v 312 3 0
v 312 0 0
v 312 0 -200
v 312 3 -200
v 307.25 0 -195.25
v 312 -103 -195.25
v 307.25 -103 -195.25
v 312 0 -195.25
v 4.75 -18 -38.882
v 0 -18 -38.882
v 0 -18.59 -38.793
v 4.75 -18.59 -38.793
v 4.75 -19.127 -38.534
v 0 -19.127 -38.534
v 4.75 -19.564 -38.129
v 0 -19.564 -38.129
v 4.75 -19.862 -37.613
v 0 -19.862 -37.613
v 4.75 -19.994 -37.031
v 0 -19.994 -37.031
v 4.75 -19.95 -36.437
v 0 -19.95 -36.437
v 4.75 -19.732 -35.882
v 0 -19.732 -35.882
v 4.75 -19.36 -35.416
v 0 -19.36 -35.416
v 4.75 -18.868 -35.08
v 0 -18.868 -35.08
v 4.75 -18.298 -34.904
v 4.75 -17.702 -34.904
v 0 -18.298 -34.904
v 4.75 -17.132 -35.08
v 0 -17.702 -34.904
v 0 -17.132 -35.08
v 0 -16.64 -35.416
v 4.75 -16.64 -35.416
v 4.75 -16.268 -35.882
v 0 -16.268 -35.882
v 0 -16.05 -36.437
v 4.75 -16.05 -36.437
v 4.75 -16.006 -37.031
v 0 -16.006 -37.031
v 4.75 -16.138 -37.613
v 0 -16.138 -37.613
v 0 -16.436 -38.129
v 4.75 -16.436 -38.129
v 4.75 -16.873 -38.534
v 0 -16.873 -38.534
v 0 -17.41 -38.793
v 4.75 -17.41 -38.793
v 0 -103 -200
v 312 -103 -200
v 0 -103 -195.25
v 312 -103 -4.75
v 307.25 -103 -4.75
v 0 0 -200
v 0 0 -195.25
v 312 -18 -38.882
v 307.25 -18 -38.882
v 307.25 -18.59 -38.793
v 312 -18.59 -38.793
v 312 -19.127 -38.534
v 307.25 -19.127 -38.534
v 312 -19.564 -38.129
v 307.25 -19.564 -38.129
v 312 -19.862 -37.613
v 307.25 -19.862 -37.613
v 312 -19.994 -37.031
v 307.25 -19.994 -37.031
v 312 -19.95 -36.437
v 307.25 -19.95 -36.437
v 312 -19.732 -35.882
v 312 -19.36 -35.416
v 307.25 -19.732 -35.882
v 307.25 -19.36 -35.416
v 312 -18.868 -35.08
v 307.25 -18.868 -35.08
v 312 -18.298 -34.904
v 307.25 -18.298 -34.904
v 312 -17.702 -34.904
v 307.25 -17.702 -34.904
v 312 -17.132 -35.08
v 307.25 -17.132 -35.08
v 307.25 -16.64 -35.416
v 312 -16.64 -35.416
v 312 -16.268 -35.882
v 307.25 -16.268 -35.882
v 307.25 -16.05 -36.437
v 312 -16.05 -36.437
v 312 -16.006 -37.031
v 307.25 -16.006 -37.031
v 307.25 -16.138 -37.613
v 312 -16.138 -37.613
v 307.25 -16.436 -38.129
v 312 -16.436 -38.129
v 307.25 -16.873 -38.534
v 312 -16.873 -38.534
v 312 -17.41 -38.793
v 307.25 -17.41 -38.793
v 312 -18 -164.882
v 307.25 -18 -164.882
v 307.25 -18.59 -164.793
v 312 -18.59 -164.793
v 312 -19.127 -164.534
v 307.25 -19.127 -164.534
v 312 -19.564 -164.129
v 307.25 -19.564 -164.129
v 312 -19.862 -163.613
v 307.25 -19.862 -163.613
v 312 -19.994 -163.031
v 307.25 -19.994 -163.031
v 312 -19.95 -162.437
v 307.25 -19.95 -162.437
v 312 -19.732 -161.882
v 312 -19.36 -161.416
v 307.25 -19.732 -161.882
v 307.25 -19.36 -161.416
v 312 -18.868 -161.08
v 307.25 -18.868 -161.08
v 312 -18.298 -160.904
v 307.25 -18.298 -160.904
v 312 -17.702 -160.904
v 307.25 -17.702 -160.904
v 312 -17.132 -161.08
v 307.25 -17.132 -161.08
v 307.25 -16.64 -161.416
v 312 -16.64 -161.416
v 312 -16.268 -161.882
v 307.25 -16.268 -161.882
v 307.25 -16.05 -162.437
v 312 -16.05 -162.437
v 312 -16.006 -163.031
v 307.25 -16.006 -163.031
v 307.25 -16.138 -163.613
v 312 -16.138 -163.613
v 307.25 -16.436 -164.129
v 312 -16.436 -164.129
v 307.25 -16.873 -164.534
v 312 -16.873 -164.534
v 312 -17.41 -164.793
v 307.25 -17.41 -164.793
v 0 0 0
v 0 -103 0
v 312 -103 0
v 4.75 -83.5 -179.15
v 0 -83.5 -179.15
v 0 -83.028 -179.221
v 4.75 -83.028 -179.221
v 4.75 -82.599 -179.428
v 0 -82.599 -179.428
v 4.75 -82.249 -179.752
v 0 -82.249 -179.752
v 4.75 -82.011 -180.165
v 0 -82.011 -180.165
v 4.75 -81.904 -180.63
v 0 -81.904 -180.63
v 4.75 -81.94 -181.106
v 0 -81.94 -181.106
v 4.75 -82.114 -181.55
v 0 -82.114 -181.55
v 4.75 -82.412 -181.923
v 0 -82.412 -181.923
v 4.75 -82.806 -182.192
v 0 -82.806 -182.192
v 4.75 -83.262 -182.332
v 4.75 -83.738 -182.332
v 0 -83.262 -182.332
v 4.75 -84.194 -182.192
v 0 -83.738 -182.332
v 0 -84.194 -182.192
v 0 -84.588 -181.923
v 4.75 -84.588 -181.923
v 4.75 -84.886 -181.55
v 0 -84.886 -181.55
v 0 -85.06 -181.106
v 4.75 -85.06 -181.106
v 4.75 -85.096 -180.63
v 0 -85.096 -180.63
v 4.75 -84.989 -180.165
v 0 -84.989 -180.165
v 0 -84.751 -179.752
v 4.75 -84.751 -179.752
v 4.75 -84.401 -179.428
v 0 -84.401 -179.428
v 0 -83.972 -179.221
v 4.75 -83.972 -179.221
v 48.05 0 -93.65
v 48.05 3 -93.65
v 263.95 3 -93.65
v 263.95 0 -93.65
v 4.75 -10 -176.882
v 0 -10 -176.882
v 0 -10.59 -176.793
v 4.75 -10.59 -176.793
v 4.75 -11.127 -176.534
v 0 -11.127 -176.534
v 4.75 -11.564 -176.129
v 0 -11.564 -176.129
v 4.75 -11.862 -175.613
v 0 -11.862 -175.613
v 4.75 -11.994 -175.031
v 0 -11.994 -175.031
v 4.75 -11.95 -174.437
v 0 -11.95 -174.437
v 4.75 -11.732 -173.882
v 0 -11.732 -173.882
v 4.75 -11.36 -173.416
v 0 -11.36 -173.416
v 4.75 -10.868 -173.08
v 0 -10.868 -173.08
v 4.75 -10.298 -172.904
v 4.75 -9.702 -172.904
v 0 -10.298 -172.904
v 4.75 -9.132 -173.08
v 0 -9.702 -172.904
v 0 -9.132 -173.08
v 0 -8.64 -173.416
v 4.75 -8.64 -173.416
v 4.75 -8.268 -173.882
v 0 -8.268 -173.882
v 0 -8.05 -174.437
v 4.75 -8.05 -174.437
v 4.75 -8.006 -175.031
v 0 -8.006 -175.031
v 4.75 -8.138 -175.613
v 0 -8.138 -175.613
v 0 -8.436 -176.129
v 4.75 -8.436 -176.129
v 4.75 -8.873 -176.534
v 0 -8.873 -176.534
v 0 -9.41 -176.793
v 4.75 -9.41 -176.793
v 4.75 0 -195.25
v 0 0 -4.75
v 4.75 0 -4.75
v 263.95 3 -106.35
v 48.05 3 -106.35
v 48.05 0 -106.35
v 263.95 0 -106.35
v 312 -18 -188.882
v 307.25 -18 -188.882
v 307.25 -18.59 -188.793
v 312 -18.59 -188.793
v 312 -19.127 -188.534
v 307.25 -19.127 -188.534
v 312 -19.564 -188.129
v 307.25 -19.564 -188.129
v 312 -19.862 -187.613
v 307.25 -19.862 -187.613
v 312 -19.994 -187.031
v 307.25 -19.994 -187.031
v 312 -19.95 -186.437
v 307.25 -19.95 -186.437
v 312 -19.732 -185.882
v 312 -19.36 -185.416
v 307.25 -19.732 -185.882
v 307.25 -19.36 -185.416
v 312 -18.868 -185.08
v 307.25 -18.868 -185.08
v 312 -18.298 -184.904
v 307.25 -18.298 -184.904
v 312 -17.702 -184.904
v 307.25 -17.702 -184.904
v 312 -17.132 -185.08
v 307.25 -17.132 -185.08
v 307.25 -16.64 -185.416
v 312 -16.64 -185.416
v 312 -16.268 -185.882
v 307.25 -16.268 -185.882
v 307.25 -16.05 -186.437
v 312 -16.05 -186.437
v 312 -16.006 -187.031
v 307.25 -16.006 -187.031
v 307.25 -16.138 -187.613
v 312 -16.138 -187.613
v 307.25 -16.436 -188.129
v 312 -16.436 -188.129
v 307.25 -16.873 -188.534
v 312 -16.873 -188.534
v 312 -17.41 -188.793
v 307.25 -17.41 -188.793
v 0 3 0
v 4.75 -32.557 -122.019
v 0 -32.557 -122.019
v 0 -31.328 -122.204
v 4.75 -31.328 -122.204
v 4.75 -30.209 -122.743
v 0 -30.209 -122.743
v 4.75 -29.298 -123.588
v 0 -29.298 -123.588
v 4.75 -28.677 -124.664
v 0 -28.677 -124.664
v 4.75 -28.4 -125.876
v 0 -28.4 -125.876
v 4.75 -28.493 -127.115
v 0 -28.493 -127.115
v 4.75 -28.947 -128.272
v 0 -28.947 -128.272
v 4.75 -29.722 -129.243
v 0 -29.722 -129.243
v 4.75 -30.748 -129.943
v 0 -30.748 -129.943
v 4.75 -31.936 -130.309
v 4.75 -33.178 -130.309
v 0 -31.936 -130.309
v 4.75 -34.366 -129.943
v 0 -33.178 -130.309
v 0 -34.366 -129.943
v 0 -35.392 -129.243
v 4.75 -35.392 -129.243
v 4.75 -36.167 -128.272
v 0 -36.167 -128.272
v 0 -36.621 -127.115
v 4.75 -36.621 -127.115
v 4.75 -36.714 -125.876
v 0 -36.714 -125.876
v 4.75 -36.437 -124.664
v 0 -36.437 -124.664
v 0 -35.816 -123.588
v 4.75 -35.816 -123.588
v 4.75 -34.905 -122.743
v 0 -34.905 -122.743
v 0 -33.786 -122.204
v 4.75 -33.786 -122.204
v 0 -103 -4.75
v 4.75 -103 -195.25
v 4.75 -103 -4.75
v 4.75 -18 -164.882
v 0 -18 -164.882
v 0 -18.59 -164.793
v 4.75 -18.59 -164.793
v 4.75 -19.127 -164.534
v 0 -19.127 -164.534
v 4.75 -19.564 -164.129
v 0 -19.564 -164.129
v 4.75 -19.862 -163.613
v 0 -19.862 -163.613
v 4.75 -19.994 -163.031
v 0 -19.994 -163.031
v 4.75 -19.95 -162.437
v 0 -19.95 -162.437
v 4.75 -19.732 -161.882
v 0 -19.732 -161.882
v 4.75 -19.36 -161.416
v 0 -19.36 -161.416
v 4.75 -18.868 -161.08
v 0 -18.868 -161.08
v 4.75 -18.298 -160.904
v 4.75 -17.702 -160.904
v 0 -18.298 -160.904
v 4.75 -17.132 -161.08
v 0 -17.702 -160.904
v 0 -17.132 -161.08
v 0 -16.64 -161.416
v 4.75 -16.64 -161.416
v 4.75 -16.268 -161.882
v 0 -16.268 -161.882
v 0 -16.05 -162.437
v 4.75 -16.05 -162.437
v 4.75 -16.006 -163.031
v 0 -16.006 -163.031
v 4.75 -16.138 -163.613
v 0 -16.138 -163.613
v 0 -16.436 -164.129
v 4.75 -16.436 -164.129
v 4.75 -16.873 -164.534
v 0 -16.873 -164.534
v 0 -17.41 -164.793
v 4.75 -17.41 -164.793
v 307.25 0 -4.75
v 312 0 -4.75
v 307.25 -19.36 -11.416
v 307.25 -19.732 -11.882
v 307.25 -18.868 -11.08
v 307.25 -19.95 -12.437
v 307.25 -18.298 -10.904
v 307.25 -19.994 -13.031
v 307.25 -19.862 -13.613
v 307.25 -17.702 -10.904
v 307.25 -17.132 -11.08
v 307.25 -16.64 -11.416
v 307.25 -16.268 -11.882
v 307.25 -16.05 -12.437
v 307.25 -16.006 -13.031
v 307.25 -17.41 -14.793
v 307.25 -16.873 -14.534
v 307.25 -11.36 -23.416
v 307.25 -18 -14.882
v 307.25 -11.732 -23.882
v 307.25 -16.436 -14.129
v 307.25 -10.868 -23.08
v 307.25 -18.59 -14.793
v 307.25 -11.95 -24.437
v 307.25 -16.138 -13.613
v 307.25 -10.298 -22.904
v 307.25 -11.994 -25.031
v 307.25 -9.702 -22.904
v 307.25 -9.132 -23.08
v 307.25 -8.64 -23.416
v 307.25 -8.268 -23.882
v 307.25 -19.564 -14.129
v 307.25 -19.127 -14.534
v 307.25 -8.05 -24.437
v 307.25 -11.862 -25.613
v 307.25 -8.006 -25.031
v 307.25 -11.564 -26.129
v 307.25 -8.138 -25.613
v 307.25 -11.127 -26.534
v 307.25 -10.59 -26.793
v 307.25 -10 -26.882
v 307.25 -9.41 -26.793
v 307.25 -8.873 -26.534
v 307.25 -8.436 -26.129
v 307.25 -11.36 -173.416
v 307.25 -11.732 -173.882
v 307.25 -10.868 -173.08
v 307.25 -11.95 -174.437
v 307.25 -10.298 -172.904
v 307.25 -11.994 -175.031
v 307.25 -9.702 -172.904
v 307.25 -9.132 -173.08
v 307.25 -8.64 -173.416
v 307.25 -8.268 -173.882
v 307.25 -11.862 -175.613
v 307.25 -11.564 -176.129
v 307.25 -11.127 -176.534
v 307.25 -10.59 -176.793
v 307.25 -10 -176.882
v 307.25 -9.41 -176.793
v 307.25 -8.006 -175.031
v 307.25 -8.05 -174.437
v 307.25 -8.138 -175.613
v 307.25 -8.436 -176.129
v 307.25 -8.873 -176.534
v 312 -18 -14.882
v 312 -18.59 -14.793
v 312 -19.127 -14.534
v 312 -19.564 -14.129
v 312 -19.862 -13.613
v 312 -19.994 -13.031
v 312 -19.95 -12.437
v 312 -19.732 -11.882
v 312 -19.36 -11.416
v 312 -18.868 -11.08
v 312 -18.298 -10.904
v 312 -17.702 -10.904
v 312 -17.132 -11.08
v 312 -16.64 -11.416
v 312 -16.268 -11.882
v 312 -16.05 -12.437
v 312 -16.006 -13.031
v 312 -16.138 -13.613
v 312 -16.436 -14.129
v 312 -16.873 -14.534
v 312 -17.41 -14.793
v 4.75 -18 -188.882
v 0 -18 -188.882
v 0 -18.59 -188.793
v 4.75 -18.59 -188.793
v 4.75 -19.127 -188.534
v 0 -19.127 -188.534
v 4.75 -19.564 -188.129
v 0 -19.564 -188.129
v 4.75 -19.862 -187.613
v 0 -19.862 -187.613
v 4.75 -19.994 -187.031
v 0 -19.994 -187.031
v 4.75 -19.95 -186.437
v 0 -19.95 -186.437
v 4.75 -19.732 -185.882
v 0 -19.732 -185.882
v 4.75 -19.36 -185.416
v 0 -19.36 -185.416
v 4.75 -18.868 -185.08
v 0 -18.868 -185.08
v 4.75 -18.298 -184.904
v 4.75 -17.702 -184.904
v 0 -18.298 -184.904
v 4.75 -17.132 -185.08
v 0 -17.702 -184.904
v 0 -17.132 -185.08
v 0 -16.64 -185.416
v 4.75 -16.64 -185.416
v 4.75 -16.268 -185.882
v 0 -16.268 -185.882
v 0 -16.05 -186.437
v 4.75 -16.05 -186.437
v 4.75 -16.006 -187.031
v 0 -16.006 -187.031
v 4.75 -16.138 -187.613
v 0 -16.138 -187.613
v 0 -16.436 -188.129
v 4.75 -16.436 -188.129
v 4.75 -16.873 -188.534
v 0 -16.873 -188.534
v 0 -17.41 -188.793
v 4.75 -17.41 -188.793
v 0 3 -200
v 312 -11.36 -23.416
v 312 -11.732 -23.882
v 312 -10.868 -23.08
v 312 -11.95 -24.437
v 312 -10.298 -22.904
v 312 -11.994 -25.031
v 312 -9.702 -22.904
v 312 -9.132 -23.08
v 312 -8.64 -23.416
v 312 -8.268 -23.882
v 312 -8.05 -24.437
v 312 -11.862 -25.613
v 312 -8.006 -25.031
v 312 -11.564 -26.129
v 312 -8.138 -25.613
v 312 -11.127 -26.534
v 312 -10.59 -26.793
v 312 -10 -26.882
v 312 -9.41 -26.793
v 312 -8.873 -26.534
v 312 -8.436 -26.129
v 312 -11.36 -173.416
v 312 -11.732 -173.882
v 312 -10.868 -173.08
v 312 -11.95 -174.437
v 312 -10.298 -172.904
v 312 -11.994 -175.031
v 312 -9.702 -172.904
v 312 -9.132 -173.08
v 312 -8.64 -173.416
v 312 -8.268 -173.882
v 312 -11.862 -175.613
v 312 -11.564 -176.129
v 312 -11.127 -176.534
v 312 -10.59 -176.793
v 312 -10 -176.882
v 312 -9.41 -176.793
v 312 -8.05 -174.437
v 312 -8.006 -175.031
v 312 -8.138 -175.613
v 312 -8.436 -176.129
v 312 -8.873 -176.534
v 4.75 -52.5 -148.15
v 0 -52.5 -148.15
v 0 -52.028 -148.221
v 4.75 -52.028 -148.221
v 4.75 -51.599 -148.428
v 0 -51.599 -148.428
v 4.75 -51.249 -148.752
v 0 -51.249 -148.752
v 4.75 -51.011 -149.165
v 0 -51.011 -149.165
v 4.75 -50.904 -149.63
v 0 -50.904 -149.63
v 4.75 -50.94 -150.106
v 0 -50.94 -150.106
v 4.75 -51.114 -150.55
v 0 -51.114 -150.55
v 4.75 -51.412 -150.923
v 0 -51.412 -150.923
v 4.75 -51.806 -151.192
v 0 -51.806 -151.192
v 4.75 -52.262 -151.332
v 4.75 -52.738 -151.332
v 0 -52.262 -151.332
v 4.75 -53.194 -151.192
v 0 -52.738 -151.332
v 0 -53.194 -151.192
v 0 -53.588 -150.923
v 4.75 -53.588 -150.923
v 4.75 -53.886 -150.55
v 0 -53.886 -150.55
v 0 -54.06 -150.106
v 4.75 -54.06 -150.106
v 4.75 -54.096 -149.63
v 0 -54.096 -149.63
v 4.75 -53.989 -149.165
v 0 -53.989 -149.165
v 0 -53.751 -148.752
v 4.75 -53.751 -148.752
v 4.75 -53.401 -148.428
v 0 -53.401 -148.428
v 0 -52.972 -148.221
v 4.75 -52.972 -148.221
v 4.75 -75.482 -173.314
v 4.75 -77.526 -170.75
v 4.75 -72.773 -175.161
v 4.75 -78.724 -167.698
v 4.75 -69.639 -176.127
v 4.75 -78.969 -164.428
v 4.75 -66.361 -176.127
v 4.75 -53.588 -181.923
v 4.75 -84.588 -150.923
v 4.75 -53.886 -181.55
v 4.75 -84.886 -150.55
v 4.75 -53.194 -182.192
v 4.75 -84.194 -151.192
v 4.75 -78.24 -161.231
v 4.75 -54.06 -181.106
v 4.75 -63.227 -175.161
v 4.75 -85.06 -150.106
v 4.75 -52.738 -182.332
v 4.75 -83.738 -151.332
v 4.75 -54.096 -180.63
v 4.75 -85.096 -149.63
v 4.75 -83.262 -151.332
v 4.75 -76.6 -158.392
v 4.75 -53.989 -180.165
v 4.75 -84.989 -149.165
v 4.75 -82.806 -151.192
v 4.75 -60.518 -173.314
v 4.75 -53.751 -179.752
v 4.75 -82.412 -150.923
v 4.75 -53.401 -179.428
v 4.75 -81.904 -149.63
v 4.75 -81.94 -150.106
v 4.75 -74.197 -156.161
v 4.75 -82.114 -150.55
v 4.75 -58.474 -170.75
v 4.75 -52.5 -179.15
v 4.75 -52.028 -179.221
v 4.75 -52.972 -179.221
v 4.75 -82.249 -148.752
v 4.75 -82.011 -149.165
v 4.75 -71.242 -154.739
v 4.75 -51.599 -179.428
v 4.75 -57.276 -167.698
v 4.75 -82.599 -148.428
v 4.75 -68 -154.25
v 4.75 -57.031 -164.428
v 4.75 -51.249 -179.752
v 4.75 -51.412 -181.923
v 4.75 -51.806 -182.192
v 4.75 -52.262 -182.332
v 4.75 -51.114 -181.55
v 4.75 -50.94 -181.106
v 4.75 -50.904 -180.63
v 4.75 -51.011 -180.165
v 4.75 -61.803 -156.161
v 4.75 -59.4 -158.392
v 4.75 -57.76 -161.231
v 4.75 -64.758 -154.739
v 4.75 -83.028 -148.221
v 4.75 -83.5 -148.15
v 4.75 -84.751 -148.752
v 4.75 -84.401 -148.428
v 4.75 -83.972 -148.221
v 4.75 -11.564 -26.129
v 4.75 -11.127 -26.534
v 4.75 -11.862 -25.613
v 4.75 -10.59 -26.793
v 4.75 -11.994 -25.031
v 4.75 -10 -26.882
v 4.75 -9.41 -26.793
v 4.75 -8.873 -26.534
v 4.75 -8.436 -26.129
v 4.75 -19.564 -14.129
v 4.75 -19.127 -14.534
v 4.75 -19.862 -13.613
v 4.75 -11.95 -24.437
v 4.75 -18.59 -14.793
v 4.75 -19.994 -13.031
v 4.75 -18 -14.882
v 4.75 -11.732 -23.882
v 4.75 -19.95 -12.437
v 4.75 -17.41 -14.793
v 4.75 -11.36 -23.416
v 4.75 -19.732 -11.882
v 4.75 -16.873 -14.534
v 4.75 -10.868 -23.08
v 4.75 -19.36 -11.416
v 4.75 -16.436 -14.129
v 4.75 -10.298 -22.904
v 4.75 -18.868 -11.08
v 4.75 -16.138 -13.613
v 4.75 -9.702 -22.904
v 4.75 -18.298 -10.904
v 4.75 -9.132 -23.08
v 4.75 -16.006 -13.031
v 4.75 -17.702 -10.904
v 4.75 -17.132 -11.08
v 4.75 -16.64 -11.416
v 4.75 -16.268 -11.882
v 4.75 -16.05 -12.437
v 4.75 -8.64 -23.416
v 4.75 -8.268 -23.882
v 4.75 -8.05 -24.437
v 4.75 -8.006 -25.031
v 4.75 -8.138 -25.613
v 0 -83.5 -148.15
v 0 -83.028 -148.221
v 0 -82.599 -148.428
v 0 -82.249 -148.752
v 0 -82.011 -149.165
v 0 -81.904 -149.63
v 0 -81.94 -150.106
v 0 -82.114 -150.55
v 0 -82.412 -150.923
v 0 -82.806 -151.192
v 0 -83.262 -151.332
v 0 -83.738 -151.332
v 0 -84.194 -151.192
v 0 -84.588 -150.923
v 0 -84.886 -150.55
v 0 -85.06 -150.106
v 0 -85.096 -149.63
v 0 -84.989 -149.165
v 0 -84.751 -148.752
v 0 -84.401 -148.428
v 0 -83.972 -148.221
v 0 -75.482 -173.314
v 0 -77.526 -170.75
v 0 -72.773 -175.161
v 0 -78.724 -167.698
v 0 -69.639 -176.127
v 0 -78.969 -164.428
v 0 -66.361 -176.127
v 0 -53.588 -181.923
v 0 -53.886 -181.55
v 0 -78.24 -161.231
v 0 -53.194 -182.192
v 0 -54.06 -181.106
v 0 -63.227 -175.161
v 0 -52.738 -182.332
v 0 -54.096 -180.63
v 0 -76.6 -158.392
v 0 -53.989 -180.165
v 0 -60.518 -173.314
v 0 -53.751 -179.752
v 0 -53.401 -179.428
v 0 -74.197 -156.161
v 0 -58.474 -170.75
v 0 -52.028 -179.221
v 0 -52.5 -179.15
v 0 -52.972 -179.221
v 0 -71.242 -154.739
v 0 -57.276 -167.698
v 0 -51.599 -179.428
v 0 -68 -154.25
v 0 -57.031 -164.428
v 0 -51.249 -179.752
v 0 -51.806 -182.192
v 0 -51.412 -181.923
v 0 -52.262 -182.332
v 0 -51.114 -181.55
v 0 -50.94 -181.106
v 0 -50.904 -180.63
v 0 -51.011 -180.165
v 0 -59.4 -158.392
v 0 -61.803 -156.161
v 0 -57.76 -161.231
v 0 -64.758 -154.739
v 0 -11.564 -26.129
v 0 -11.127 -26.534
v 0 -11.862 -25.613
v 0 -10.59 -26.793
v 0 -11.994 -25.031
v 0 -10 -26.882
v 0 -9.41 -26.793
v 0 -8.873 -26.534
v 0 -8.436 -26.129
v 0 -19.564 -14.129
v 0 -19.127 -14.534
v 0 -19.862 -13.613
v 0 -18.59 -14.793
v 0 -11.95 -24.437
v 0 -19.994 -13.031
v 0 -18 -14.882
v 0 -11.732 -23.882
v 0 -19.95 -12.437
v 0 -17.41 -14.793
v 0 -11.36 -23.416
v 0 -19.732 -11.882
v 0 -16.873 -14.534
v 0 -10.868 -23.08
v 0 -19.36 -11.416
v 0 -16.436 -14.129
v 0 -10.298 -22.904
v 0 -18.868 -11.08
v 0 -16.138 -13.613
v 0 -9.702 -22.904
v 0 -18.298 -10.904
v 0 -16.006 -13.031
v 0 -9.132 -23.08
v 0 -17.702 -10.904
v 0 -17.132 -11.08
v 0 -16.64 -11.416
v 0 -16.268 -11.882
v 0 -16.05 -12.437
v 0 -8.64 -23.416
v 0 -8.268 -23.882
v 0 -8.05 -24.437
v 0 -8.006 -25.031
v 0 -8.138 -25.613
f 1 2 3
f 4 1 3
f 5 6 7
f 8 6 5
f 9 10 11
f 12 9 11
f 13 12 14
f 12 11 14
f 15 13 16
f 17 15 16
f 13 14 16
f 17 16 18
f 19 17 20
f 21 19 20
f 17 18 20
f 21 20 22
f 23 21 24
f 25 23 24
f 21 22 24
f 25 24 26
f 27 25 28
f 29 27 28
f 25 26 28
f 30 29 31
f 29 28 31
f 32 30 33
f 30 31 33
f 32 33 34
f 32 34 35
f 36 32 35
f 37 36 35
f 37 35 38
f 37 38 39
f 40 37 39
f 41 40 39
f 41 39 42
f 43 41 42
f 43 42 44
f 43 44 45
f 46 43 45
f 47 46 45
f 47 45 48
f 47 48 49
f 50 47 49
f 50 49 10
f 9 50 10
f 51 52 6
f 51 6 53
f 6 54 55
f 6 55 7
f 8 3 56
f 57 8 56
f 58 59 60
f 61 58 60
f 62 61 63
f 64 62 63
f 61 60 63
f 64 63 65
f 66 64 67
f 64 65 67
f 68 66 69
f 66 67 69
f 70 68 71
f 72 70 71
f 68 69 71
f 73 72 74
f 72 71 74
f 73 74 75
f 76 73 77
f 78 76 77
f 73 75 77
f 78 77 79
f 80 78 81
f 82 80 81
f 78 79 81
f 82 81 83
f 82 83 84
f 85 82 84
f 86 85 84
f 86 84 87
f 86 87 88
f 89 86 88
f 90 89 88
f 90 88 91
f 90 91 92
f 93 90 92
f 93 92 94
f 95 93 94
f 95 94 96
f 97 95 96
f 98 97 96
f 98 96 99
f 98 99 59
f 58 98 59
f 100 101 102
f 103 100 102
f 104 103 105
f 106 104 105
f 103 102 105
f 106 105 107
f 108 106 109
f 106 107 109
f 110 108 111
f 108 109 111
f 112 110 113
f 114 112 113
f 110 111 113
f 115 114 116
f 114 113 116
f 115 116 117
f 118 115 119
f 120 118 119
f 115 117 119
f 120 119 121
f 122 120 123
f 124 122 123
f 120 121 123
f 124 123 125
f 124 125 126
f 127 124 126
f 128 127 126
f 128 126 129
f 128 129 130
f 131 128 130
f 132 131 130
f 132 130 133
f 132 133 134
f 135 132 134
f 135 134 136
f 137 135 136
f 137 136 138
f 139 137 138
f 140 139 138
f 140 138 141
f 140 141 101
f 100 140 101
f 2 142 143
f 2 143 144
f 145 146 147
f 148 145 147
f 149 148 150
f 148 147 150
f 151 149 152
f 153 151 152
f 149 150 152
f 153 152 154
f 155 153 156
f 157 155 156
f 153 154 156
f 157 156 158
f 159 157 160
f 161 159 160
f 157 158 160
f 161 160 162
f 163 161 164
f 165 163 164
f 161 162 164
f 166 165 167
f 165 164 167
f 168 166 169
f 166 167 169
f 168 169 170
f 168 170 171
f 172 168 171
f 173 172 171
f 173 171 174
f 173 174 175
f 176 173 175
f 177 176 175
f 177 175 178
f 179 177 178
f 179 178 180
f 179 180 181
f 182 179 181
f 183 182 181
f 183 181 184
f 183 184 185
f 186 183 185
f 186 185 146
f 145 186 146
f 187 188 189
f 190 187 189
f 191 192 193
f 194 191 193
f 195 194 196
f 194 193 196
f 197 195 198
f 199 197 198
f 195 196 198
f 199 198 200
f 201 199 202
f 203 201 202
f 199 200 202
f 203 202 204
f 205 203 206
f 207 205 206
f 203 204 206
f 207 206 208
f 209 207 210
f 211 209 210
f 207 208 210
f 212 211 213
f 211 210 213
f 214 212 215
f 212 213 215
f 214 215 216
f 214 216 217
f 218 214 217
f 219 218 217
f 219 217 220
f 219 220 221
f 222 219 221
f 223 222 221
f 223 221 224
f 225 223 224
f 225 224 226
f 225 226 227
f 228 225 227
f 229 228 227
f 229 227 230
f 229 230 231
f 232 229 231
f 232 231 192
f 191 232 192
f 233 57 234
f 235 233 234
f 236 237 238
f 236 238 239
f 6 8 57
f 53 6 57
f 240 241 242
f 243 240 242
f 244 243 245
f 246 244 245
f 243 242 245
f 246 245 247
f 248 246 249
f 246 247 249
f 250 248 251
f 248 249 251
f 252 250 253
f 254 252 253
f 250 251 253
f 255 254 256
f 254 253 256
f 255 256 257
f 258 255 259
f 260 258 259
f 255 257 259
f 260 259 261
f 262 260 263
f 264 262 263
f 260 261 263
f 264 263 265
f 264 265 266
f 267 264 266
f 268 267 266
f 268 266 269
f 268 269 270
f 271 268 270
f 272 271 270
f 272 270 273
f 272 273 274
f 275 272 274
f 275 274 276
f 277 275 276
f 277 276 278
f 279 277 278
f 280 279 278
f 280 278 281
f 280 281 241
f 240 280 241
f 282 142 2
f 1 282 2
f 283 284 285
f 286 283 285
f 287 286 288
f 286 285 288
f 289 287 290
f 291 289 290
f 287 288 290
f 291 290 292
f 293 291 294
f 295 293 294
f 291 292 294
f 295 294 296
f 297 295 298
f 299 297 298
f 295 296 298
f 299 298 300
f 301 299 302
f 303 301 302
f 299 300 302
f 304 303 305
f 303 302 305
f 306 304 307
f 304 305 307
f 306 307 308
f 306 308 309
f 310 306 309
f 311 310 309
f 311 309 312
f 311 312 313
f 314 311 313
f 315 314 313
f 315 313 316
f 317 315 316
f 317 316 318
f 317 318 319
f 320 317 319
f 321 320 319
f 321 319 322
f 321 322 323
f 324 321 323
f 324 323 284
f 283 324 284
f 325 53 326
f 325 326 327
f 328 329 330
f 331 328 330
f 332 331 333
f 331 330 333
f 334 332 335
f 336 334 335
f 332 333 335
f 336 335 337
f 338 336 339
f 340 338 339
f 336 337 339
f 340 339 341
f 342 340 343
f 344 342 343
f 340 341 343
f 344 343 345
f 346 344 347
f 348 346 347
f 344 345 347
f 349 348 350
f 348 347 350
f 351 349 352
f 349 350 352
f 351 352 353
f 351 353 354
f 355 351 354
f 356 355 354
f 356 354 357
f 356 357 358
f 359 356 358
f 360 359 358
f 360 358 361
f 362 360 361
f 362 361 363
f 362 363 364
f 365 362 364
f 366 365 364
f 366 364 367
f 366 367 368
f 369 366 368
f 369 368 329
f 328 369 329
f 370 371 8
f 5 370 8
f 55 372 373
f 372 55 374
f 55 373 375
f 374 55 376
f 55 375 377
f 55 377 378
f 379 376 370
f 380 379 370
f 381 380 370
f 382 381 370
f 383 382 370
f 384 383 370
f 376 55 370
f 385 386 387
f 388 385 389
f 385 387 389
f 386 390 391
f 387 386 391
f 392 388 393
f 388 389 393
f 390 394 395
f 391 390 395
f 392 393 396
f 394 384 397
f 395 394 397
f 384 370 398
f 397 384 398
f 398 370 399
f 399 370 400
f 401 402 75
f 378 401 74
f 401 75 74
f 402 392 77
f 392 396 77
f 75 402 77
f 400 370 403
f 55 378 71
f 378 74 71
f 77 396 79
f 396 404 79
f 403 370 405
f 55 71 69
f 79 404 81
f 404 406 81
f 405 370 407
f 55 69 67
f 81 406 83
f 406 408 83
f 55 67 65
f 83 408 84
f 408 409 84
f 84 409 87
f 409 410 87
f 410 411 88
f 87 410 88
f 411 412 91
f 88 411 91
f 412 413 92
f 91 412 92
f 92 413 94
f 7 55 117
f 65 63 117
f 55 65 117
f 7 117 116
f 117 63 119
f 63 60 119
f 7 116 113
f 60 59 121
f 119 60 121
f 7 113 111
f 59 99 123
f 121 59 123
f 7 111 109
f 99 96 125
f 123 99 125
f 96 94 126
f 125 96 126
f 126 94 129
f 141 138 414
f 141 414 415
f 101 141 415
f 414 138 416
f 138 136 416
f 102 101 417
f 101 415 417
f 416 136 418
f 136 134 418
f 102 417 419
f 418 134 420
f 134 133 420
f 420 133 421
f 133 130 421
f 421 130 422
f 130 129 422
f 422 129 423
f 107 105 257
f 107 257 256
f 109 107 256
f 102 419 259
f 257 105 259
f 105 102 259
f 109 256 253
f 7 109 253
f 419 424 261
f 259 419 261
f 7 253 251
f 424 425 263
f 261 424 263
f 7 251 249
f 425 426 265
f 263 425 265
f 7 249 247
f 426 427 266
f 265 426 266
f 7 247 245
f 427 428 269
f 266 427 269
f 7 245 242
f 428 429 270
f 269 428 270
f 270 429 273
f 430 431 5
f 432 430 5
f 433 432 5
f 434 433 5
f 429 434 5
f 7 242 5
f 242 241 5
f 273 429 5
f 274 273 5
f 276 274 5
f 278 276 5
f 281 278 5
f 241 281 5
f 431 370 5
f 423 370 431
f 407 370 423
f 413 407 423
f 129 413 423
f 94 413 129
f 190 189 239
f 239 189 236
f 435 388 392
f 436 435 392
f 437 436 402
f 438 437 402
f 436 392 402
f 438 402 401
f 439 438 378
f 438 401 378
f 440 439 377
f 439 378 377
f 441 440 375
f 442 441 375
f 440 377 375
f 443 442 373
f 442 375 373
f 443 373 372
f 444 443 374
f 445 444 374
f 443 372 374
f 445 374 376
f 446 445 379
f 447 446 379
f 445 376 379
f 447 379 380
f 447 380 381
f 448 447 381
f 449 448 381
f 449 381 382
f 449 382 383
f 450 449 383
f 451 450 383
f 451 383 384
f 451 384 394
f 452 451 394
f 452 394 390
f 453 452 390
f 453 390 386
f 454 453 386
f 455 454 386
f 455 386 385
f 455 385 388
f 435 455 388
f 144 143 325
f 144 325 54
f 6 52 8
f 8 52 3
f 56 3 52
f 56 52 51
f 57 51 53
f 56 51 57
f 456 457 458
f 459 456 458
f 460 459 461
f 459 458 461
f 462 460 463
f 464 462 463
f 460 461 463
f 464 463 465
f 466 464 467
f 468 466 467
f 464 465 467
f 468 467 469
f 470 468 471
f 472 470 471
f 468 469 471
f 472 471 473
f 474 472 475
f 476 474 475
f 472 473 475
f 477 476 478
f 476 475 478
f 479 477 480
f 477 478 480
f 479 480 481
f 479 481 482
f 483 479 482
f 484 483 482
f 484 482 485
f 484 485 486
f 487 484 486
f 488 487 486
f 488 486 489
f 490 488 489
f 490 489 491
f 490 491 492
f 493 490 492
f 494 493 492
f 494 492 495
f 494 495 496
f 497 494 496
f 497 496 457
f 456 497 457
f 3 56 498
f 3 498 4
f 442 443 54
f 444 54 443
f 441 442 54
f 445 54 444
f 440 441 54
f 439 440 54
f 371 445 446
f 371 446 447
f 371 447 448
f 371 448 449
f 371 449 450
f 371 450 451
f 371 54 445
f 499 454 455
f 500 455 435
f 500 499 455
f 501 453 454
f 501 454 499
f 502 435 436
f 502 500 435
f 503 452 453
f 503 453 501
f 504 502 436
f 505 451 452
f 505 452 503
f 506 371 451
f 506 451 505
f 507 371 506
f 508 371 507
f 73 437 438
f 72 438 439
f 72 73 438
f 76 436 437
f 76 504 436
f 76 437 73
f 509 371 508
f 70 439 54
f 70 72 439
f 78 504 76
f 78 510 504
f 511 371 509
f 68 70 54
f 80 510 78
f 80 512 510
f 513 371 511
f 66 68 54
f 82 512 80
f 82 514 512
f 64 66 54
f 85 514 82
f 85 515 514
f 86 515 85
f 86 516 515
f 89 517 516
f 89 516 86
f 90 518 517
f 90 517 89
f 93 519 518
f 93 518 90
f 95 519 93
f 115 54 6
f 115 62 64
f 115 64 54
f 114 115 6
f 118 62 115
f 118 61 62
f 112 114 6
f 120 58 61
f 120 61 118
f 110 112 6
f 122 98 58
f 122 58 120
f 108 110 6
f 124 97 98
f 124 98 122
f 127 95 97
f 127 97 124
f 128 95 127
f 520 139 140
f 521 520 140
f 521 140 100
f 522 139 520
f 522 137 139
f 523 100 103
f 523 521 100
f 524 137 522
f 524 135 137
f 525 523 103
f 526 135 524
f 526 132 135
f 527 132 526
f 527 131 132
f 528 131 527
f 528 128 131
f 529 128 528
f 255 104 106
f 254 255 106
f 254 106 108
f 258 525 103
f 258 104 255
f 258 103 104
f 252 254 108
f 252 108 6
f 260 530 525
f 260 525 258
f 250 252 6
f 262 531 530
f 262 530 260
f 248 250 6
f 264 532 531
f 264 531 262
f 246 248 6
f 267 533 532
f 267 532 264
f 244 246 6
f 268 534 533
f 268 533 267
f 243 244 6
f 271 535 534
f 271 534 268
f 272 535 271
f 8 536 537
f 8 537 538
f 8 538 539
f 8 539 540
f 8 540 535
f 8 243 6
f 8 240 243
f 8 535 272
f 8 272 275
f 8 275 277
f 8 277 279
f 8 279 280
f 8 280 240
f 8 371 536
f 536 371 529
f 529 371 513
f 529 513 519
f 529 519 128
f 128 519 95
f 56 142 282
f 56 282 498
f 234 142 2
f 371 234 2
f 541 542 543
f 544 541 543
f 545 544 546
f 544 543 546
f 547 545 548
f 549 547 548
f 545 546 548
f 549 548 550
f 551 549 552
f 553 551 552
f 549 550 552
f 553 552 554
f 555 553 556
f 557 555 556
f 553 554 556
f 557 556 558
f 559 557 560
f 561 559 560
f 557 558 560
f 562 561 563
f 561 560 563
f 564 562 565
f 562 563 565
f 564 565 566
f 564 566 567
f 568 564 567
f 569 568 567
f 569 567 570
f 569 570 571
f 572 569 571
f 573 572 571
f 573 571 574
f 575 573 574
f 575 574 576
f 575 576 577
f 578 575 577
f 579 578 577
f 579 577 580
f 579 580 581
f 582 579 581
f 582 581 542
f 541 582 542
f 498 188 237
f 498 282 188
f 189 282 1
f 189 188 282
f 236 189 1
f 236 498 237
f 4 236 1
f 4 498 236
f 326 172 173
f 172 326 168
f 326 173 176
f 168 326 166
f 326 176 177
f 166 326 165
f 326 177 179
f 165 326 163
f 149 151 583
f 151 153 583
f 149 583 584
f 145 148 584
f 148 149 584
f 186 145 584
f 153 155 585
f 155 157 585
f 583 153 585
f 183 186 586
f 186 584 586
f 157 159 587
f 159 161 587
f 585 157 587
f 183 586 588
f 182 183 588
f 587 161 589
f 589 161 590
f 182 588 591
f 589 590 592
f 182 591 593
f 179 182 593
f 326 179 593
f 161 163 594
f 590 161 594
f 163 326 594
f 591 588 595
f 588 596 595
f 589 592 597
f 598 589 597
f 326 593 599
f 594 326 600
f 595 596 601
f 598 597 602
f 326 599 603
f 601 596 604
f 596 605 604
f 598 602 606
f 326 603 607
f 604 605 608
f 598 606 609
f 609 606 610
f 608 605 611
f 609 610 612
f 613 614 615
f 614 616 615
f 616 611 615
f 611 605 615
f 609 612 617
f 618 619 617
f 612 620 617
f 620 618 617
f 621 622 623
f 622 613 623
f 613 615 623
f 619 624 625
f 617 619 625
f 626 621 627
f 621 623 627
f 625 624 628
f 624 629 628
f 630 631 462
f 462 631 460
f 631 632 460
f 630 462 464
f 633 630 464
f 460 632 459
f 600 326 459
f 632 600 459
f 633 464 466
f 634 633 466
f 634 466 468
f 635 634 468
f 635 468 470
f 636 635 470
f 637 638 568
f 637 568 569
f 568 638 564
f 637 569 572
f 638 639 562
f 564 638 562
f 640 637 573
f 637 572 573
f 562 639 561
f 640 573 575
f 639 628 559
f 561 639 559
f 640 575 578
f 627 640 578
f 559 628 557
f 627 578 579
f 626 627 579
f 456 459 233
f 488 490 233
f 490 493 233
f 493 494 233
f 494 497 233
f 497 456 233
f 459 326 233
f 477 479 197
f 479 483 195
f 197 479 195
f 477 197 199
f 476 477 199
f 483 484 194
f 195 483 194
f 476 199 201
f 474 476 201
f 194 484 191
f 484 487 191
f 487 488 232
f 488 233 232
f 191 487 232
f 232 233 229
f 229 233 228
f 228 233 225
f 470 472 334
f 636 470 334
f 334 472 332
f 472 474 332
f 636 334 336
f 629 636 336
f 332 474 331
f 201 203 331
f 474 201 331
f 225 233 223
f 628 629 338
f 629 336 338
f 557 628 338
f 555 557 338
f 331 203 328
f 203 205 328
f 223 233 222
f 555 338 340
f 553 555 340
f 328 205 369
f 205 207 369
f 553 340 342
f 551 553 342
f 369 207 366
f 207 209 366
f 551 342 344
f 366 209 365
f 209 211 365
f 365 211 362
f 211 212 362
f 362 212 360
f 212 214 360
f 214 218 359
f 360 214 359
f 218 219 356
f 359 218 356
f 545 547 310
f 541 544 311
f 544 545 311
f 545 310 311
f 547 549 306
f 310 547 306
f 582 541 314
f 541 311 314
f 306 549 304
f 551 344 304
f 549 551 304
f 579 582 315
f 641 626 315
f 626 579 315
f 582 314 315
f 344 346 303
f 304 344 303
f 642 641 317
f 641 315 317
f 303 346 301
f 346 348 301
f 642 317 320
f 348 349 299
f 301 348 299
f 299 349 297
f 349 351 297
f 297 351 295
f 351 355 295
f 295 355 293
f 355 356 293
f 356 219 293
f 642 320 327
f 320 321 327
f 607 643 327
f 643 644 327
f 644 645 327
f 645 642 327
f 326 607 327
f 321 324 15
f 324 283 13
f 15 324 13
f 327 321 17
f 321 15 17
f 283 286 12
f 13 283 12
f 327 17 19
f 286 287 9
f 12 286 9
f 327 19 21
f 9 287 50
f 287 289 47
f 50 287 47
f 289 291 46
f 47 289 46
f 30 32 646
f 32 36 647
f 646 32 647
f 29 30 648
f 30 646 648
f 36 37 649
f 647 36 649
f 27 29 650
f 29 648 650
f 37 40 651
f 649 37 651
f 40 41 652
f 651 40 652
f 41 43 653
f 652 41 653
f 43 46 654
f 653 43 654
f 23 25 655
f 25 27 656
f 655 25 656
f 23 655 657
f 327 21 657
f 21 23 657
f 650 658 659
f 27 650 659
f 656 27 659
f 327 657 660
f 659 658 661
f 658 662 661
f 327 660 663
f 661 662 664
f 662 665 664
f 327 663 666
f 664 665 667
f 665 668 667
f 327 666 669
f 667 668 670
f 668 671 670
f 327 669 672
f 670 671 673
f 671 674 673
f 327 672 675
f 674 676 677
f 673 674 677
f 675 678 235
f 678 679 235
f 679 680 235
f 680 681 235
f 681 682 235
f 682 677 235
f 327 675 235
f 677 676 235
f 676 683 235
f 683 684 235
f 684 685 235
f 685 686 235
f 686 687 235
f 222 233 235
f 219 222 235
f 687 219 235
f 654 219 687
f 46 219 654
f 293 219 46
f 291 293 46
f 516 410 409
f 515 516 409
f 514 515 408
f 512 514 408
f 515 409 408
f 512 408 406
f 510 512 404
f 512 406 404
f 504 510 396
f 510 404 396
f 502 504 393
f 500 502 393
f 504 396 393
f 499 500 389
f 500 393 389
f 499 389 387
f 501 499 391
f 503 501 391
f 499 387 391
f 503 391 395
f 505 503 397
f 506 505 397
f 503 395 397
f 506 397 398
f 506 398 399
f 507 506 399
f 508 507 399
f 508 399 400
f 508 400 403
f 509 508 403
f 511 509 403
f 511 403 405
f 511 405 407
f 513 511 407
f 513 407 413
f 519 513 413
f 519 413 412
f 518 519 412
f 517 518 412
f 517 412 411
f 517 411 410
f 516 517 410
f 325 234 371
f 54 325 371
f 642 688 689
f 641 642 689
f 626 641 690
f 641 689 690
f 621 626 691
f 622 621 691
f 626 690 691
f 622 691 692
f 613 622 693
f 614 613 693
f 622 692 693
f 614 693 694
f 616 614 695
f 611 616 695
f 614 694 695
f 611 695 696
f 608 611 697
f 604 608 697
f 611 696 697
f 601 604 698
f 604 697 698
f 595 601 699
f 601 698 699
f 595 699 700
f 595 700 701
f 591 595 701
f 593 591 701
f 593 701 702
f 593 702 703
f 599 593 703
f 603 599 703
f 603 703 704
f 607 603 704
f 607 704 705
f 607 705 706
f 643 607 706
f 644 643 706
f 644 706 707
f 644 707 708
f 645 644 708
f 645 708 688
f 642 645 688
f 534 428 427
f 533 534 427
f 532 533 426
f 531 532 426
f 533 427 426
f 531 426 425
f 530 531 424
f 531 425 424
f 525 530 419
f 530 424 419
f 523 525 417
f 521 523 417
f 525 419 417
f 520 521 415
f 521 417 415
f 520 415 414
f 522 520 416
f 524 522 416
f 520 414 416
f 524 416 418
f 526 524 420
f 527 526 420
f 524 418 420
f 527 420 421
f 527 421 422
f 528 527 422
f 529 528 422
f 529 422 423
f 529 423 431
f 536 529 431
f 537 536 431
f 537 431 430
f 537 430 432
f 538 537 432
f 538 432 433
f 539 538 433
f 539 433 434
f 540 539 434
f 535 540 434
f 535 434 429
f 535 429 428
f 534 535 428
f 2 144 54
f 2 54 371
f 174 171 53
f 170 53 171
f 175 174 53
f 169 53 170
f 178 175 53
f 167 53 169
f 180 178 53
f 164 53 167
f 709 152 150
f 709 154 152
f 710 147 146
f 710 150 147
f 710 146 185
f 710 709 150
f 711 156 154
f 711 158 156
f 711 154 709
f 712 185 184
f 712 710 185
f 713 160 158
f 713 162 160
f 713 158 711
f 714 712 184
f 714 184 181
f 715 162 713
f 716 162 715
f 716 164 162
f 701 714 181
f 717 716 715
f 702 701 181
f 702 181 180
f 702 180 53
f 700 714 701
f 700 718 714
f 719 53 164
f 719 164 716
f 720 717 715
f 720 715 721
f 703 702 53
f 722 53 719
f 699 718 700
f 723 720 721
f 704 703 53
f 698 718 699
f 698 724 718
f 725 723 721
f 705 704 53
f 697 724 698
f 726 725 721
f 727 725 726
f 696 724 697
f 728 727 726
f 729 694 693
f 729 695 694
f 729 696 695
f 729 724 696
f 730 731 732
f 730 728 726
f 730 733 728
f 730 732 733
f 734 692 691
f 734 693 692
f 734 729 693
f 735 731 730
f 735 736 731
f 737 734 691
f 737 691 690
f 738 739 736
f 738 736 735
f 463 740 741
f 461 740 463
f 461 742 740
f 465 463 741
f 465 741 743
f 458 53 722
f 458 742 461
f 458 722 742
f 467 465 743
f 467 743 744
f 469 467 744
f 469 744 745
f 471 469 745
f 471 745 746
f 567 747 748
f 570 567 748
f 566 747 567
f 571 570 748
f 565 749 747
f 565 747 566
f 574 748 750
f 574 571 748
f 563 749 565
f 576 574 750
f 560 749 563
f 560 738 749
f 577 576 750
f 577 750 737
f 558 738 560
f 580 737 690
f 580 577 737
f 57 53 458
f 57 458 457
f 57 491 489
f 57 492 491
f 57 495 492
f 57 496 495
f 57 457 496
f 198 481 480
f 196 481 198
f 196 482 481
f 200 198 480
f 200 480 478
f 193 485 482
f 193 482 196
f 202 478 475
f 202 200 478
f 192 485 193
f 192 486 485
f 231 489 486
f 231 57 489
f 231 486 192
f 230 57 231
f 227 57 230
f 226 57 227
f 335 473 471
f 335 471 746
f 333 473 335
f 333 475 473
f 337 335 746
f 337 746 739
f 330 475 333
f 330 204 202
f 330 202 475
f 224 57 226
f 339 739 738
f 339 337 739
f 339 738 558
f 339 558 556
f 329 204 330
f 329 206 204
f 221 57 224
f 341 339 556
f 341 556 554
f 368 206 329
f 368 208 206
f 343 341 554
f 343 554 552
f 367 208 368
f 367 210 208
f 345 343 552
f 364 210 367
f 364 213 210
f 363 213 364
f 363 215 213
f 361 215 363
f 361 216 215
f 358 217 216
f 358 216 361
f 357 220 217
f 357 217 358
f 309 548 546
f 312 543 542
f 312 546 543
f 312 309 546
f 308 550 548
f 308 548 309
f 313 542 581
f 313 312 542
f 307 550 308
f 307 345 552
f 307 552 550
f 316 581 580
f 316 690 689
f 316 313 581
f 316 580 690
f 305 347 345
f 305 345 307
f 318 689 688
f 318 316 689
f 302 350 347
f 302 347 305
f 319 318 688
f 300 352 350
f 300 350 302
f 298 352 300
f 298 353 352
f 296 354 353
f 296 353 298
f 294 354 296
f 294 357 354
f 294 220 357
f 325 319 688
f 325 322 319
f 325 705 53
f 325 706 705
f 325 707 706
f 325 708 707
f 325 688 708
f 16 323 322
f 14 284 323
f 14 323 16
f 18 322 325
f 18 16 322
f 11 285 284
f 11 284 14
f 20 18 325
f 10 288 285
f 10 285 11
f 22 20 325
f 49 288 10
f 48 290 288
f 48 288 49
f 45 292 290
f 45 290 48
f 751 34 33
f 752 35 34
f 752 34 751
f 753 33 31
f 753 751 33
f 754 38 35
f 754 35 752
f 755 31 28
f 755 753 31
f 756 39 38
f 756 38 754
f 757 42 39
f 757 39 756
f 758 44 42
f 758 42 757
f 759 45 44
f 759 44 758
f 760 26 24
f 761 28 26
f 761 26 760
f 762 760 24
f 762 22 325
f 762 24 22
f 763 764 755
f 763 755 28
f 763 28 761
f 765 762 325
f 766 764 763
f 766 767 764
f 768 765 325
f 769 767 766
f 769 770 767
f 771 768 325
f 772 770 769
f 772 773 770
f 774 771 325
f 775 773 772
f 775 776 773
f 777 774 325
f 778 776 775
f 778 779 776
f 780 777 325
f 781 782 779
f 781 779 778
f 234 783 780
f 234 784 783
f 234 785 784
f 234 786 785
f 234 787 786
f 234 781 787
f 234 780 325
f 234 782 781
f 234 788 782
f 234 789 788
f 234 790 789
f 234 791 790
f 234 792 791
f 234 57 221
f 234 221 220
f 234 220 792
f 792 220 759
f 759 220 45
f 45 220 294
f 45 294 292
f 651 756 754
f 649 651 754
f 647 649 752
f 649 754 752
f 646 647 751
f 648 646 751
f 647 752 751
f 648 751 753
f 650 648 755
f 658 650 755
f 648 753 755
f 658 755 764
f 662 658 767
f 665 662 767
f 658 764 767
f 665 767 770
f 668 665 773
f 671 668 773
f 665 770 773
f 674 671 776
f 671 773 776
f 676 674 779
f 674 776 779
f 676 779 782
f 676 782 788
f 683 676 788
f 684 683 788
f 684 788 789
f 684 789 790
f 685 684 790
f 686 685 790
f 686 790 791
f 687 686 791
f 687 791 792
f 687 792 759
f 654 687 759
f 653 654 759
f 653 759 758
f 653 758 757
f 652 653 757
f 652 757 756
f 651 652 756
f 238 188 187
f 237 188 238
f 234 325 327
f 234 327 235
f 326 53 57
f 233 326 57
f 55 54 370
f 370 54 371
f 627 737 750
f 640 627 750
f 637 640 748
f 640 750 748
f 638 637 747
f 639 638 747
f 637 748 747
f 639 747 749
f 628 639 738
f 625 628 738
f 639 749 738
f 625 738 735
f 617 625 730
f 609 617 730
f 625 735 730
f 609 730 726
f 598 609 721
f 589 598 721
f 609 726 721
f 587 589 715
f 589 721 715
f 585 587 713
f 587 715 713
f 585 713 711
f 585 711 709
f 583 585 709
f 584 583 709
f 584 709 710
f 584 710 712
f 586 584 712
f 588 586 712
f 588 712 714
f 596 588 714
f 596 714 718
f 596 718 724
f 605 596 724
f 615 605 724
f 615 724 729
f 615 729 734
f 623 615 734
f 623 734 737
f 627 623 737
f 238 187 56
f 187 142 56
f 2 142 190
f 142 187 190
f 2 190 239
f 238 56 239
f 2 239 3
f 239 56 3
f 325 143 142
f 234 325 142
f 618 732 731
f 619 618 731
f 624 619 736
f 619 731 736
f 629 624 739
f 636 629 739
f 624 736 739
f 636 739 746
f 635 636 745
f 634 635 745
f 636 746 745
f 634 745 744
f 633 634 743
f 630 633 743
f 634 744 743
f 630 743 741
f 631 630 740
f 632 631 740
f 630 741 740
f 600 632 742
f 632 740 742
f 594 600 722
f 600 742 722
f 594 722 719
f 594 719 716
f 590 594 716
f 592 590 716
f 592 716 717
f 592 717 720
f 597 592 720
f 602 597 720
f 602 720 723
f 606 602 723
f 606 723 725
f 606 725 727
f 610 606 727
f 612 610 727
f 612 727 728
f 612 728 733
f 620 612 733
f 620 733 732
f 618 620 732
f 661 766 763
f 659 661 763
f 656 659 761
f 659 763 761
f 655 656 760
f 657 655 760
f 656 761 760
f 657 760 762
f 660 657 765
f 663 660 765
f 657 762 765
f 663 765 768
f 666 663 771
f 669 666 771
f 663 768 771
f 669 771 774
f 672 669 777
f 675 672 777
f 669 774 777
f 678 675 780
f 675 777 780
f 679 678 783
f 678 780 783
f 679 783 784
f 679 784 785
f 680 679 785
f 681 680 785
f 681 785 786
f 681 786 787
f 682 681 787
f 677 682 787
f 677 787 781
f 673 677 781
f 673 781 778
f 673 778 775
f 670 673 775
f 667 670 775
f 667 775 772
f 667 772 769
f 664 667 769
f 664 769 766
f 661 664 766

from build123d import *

# Parameters (mm, degrees)
SKETCH1_W                    = 312
SKETCH1_H                    = 200
BOSS_EXTRUDE1_DEPTH          = 4.75
SKETCH2_W                    = 215.9
SKETCH2_H                    = 12.7
CUT_EXTRUDE6_DEPTH           = 10
SKETCH3_R                    = 1.55
SKETCH3_R_2                  = 1.905
CUT_EXTRUDE2_DEPTH           = 3.81
CONVERT_SOLID1_START         = 3
CONVERT_SOLID1_OUTLINE_W     = 312
CONVERT_SOLID1_OUTLINE_H     = 200
CONVERT_SOLID1_OUTLINE_R     = 1.55
CONVERT_SOLID1_OUTLINE_R_2   = 1.905
CONVERT_SOLID1_OUTLINE_W_2   = 215.9
CONVERT_SOLID1_OUTLINE_H_2   = 12.7
CONVERT_SOLID1_DEPTH         = 1.75
CONVERT_SOLID1_START_2       = 0.94
CONVERT_SOLID1_2_OUTLINE_R   = 1.55
CONVERT_SOLID1_2_OUTLINE_R_2 = 1.905
CONVERT_SOLID1_2_DEPTH       = 2.06
SKETCH25_W                   = 312
SKETCH25_H                   = 103
BOSS_EXTRUDE3_DEPTH          = 4.75
SKETCH26_W                   = 312
SKETCH26_H                   = 103
BOSS_EXTRUDE4_DEPTH          = 4.75
SKETCH27_W                   = 190.5
SKETCH27_H                   = 103
BOSS_EXTRUDE5_DEPTH          = 4.75
SKETCH28_W                   = 190.5
SKETCH28_H                   = 103
BOSS_EXTRUDE6_DEPTH          = 4.75
SKETCH30_R                   = 11
SKETCH30_R_2                 = 1.6
SKETCH30_R_3                 = 4.168475053
CUT_EXTRUDE7_DEPTH           = 10
SKETCH32_R                   = 2
CUT_EXTRUDE8_DEPTH           = 392


# Read off the part's stored shape, not the designer's step: Convert-Solid1
with BuildPart() as part:
    # Sketch1 → Boss-Extrude1 (new body)
    with BuildSketch(Plane(origin=(0, 0, 0), x_dir=(1, 0, 0), z_dir=(0, 1, 0))):
        with Locations((156, 100)):
            Rectangle(SKETCH1_W, SKETCH1_H)
    extrude(amount=BOSS_EXTRUDE1_DEPTH)

    # Sketch2 → Cut-Extrude6 (cut)
    with BuildSketch(Plane(origin=(0, 4.75, 0), x_dir=(1, 0, 0), z_dir=(0, 1, 0))):
        with Locations((156, 100)):
            Rectangle(SKETCH2_W, SKETCH2_H)
    extrude(amount=-CUT_EXTRUDE6_DEPTH, mode=Mode.SUBTRACT)

    # Sketch3 → Cut-Extrude2 (cut)
    with BuildSketch(Plane(origin=(0, 4.75, 0), x_dir=(1, 0, 0), z_dir=(0, 1, 0))):
        with Locations(Location((43.605, 65, 0), (0, 0, 270))):
            Circle(SKETCH3_R)
        with Locations(Location((43.605, 135, 0), (0, 0, 270))):
            Circle(SKETCH3_R_2)
        with Locations(Location((268.395, 135, 0), (0, 0, 270))):
            Circle(SKETCH3_R_2)
        with Locations(Location((268.395, 65, 0), (0, 0, 270))):
            Circle(SKETCH3_R)
    extrude(amount=-CUT_EXTRUDE2_DEPTH, mode=Mode.SUBTRACT)

    # Convert-Solid1 outline → Convert-Solid1 (cut)
    with BuildSketch(Plane(origin=(0, 0, 0), x_dir=(1, 0, 0), z_dir=(0, 1, 0)).offset(CONVERT_SOLID1_START)):
        with Locations((156, 100)):
            Rectangle(CONVERT_SOLID1_OUTLINE_W, CONVERT_SOLID1_OUTLINE_H)
        with Locations((43.605, 65)):
            Circle(CONVERT_SOLID1_OUTLINE_R, mode=Mode.SUBTRACT)
        with Locations((268.395, 65)):
            Circle(CONVERT_SOLID1_OUTLINE_R, mode=Mode.SUBTRACT)
        with Locations((43.605, 135)):
            Circle(CONVERT_SOLID1_OUTLINE_R_2, mode=Mode.SUBTRACT)
        with Locations((156, 100)):
            Rectangle(CONVERT_SOLID1_OUTLINE_W_2, CONVERT_SOLID1_OUTLINE_H_2, mode=Mode.SUBTRACT)
        with Locations((268.395, 135)):
            Circle(CONVERT_SOLID1_OUTLINE_R_2, mode=Mode.SUBTRACT)
    extrude(amount=CONVERT_SOLID1_DEPTH, mode=Mode.SUBTRACT)

    # Convert-Solid1 2 outline → Convert-Solid1 2 (add)
    with BuildSketch(Plane(origin=(0, 0, 0), x_dir=(1, 0, 0), z_dir=(0, 1, 0)).offset(CONVERT_SOLID1_START_2)):
        with Locations((43.605, 65)):
            Circle(CONVERT_SOLID1_2_OUTLINE_R)
        with Locations((43.605, 135)):
            Circle(CONVERT_SOLID1_2_OUTLINE_R_2)
        with Locations((268.395, 135)):
            Circle(CONVERT_SOLID1_2_OUTLINE_R_2)
        with Locations((268.395, 65)):
            Circle(CONVERT_SOLID1_2_OUTLINE_R)
    extrude(amount=CONVERT_SOLID1_2_DEPTH)


with BuildPart() as body_2:
    # Sketch25 → Boss-Extrude3 (new body)
    with BuildSketch(Plane.XY):
        with Locations((156, -51.5)):
            Rectangle(SKETCH25_W, SKETCH25_H)
    extrude(amount=-BOSS_EXTRUDE3_DEPTH)


with BuildPart() as body_3:
    # Sketch26 → Boss-Extrude4 (new body)
    with BuildSketch(Plane(origin=(0, 0, -200), x_dir=(-1, 0, 0), z_dir=(0, 0, -1))):
        with Locations((-156, -51.5)):
            Rectangle(SKETCH26_W, SKETCH26_H)
    extrude(amount=-BOSS_EXTRUDE4_DEPTH)


with BuildPart() as body_4:
    # Sketch27 → Boss-Extrude5 (new body)
    with BuildSketch(Plane.ZY):
        with Locations((-100, -51.5)):
            Rectangle(SKETCH27_W, SKETCH27_H)
    extrude(amount=-BOSS_EXTRUDE5_DEPTH)

    # Sketch30 → Cut-Extrude7 (cut)
    with BuildSketch(Plane.ZY):
        with Locations((-165.25, -68)):
            Circle(SKETCH30_R)
        with Locations((-149.75, -52.5)):
            Circle(SKETCH30_R_2)
        with Locations((-180.75, -52.5)):
            Circle(SKETCH30_R_2)
        with Locations((-126.187406099, -32.55692629)):
            Circle(SKETCH30_R_3)
        with Locations((-180.75, -83.5)):
            Circle(SKETCH30_R_2)
        with Locations((-149.75, -83.5)):
            Circle(SKETCH30_R_2)
    extrude(amount=-CUT_EXTRUDE7_DEPTH, mode=Mode.SUBTRACT)


with BuildPart() as body_5:
    # Sketch28 → Boss-Extrude6 (new body)
    with BuildSketch(Plane(origin=(312, 0, 0), x_dir=(0, 0, -1), z_dir=(1, 0, 0))):
        with Locations((100, -51.5)):
            Rectangle(SKETCH28_W, SKETCH28_H)
    extrude(amount=-BOSS_EXTRUDE6_DEPTH)


with BuildPart() as cut_extrude8_tool:
    # Sketch32 → Cut-Extrude8 (new body)
    with BuildSketch(Plane.ZY):
        with Locations(Location((-174.881920661, -10, 0), (0, 0, 180))):
            Circle(SKETCH32_R)
        with Locations(Location((-162.881920661, -18, 0), (0, 0, 180))):
            Circle(SKETCH32_R)
        with Locations(Location((-24.881920661, -10, 0), (0, 0, 180))):
            Circle(SKETCH32_R)
        with Locations(Location((-36.881920661, -18, 0), (0, 0, 180))):
            Circle(SKETCH32_R)
        with Locations(Location((-12.881920661, -18, 0), (0, 0, 180))):
            Circle(SKETCH32_R)
        with Locations(Location((-186.881920661, -18, 0), (0, 0, 180))):
            Circle(SKETCH32_R)
    extrude(amount=-CUT_EXTRUDE8_DEPTH)


with BuildPart() as body_4_1:
    add(body_4.part)

    # Cut-Extrude8: cut by cut_extrude8_tool
    add(cut_extrude8_tool.part, mode=Mode.SUBTRACT)


with BuildPart() as body_5_1:
    add(body_5.part)

    # Cut-Extrude8: cut by cut_extrude8_tool
    add(cut_extrude8_tool.part, mode=Mode.SUBTRACT)


solid = Compound([part.part, body_2.part, body_3.part, body_4_1.part, body_5_1.part])
